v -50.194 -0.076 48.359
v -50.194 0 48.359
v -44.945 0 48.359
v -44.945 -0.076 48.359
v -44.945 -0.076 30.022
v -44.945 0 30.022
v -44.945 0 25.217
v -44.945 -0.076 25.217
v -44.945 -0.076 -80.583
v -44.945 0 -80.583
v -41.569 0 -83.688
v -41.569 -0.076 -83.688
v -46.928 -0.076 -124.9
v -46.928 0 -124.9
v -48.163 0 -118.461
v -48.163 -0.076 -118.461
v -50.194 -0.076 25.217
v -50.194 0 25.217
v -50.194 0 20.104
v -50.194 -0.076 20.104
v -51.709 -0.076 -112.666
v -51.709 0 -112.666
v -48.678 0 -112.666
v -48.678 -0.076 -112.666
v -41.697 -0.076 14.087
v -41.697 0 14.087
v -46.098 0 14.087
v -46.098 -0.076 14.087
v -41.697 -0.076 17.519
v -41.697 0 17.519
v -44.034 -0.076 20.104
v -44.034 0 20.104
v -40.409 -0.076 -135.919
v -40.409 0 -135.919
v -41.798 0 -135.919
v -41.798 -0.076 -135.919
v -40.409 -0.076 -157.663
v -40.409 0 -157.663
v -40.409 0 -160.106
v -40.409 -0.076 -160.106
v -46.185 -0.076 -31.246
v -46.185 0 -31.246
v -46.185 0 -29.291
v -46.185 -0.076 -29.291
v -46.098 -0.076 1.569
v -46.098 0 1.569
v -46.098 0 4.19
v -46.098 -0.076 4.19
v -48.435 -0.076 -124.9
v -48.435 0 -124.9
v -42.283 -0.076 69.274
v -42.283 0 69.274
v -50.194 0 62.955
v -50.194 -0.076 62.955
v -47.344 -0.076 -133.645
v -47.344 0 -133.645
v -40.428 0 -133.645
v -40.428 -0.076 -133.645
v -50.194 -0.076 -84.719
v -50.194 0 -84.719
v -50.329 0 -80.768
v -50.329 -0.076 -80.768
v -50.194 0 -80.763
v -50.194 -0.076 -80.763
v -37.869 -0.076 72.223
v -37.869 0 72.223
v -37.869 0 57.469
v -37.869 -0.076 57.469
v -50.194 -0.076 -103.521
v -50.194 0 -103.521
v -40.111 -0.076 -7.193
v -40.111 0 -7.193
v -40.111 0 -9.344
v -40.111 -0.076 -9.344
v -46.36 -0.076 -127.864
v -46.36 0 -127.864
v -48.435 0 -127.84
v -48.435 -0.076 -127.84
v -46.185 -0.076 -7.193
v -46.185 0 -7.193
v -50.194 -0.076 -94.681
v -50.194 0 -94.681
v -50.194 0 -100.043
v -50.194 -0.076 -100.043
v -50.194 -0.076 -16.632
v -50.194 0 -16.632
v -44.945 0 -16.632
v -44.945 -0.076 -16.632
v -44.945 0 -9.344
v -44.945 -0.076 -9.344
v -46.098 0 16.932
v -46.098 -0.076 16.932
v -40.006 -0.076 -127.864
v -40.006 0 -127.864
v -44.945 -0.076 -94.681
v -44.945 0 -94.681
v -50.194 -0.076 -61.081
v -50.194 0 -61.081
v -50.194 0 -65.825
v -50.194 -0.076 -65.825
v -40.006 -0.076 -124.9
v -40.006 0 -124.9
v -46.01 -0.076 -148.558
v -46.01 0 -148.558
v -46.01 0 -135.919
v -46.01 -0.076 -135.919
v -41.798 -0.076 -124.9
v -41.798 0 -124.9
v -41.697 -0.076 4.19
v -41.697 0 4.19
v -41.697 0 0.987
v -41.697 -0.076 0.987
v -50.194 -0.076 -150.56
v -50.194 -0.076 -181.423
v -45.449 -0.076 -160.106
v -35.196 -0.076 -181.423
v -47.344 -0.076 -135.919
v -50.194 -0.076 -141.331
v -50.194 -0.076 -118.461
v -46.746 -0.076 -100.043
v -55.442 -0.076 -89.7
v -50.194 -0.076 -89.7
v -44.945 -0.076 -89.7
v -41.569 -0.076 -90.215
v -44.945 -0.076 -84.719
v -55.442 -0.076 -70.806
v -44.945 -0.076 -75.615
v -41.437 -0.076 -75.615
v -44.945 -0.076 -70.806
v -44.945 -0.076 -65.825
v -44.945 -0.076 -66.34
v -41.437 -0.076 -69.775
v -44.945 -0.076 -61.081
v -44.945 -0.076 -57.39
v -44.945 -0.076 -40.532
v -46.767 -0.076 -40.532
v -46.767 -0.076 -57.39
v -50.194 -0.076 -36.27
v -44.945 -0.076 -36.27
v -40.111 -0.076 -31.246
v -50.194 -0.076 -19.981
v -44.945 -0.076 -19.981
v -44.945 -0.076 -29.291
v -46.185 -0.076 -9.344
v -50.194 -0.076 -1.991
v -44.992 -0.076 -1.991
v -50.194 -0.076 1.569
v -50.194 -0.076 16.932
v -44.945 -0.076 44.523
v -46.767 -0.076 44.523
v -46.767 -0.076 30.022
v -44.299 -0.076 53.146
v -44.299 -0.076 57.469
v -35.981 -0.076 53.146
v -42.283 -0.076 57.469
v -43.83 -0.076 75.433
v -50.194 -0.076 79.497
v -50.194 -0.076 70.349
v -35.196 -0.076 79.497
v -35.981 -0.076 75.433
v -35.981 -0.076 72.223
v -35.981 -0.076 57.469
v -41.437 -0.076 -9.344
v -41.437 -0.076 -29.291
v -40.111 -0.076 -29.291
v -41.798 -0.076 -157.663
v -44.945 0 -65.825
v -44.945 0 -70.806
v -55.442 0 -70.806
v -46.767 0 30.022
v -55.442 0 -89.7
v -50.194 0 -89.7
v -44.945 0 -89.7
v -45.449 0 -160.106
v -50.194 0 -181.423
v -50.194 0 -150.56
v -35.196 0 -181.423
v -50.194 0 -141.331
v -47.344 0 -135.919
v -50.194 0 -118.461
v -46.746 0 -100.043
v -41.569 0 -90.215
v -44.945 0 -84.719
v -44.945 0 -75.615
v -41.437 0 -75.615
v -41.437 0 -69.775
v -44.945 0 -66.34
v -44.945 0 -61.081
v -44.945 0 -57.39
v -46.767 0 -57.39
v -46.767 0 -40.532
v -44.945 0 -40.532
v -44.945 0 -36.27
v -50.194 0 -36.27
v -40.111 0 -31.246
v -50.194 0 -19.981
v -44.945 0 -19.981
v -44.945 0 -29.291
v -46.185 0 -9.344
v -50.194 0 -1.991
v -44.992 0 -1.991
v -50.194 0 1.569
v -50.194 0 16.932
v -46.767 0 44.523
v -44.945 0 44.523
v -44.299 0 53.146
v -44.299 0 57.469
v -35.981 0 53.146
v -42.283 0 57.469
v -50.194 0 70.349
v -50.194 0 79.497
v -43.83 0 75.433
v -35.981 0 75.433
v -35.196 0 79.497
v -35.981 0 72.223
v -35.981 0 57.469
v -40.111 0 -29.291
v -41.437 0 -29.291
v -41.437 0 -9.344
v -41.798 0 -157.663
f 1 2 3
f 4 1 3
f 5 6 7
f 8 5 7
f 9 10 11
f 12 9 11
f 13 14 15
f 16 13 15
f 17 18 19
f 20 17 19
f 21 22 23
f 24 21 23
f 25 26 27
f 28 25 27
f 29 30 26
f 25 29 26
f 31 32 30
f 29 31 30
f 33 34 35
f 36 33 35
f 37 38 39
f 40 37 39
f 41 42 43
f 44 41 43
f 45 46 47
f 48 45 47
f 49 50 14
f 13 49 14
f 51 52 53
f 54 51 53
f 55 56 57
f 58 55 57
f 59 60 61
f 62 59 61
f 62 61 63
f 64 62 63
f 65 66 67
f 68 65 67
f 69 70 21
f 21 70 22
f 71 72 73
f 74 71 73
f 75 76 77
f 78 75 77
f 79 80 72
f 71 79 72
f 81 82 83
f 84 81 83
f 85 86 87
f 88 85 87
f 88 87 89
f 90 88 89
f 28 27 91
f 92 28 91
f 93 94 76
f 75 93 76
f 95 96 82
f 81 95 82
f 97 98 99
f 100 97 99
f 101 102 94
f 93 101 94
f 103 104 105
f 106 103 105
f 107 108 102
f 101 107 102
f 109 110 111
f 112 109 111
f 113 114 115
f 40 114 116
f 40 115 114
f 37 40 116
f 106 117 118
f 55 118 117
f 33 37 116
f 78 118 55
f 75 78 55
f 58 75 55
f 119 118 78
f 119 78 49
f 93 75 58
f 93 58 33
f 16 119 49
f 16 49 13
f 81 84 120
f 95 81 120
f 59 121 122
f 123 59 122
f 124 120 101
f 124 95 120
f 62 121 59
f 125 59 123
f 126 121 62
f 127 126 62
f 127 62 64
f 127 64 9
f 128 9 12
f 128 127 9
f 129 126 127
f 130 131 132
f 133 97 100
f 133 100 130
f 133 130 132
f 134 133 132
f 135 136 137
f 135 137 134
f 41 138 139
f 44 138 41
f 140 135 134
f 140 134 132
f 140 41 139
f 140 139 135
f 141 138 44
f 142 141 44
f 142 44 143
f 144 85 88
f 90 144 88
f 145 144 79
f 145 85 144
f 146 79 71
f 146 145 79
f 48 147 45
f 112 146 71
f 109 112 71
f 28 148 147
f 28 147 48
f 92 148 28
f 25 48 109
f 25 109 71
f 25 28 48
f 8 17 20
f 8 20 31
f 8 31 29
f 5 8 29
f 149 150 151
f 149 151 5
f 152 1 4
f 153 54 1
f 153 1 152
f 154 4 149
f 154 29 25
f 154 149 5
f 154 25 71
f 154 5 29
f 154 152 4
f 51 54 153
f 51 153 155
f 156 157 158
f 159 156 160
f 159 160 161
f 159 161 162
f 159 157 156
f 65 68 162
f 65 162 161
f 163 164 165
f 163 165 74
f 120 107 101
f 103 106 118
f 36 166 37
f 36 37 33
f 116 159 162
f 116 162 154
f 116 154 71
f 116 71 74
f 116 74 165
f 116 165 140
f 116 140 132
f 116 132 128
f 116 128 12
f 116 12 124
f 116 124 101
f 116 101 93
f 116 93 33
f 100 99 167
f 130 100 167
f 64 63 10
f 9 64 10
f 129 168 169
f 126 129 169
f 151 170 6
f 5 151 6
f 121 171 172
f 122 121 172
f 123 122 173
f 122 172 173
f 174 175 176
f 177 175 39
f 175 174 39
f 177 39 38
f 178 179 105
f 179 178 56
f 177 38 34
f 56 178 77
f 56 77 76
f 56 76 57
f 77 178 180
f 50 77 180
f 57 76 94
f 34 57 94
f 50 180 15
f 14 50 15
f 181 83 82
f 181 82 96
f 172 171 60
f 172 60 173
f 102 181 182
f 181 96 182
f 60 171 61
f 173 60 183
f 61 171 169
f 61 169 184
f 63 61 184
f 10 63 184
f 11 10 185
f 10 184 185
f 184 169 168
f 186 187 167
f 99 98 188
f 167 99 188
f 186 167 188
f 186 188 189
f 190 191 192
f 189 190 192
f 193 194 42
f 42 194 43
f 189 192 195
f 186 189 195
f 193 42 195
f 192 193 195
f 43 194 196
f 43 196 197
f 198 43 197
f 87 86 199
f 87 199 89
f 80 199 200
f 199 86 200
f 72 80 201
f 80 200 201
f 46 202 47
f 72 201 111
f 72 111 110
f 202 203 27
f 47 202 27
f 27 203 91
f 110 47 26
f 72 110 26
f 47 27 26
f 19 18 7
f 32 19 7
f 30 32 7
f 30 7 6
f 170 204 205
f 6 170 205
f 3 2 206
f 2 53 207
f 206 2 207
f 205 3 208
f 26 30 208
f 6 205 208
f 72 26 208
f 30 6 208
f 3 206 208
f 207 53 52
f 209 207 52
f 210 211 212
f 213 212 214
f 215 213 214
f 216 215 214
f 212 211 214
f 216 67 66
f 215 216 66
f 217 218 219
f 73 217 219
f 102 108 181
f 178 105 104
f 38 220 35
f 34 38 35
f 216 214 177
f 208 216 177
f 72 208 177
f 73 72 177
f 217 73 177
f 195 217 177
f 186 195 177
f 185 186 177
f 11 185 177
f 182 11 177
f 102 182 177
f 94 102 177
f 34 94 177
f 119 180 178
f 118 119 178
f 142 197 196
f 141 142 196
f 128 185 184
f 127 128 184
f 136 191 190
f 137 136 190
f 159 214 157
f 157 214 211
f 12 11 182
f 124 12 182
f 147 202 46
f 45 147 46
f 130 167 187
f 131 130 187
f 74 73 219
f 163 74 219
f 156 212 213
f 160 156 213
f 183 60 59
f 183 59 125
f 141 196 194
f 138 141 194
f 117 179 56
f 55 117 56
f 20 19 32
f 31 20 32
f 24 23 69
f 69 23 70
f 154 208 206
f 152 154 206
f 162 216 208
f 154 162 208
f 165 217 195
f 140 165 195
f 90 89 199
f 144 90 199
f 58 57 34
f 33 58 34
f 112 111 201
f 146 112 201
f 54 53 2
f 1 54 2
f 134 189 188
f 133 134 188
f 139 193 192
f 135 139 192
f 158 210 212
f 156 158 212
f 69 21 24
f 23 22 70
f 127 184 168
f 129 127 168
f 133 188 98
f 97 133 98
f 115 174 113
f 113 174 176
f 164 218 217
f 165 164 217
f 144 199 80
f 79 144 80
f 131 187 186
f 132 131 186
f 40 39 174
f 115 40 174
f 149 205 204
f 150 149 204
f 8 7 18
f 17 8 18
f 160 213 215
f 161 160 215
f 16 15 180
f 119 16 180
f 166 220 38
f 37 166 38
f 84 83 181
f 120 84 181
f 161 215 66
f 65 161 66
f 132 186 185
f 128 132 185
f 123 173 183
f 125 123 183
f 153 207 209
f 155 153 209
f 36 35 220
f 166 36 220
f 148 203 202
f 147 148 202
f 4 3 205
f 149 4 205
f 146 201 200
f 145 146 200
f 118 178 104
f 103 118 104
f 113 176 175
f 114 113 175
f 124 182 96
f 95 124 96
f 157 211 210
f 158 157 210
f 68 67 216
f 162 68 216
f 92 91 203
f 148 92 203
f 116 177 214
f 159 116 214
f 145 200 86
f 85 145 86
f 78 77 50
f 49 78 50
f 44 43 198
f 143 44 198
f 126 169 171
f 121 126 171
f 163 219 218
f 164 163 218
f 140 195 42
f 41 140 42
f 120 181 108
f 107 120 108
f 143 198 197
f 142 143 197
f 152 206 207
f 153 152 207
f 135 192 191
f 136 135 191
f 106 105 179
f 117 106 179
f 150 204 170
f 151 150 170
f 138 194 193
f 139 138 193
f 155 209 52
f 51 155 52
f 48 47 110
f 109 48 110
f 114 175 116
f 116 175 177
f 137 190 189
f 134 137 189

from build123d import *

# Parameters (mm, degrees)
F0_W     = 5.2482880054
F0_H     = 4.9810466543
F1_DEPTH = 0.0762


# Not quite as in the source:
# - a feature names something its author has since deleted; it is built from what else it names


with BuildPart() as f1:
    # F0 (on Front) → F1 (new body)
    with BuildSketch(Plane.XZ):
        Polygon((-35.1963832856, 79.4969911185), (-50.193608411, 79.4969911185), (-50.193608411, 70.3488993556), (-43.8295094164, 75.4326850121), (-35.9808335364, 75.4326850121), (-35.9808335364, 72.2227817215), (-37.8685602848, 72.2227817215), (-37.8685602848, 57.4692988183), (-35.9808335364, 57.4692988183), (-35.9808335364, 53.1461095161), (-44.2987100306, 53.1461095161), (-44.2987100306, 57.4692988183), (-42.2831444735, 57.4692988183), (-42.2831444735, 69.2738860086), (-50.193608411, 62.954829197), (-50.193608411, 48.3592389848), (-44.9453204056, 48.3592389848), (-44.9453204056, 44.5231835829), (-46.7674447154, 44.5231835829), (-46.7674447154, 30.0220460158), (-44.9453204056, 30.0220460158), (-44.9453204056, 25.2169134009), (-50.193608411, 25.2169134009), (-50.193608411, 20.1037506657), (-44.0339450055, 20.1037506657), (-41.6973850482, 17.5189805853), (-41.6973850482, 14.0874953759), (-46.0979307142, 14.0874953759), (-46.0979307142, 16.9323027027), (-50.193608411, 16.9323027027), (-50.193608411, 1.5689273412), (-46.0979307142, 1.5689273412), (-46.0979307142, 4.1895659023), (-41.6973850482, 4.1895659023), (-41.6973850482, 0.9874830587), (-44.9919385552, -1.9907012912), (-50.193608411, -1.9907012912), (-50.193608411, -16.6316394584), (-44.9453204056, -16.6316394584), (-44.9453204056, -9.343899268), (-46.1852711141, -9.343899268), (-46.1852711141, -7.1931303074), (-44.9453204056, -7.1931303074), (-41.4369731104, -7.1931303074), (-40.111375595, -7.1931303074), (-40.111375595, -9.343899268), (-41.4369731104, -9.343899268), (-41.4369731104, -29.2911320519), (-40.111375595, -29.2911320519), (-40.111375595, -31.2461041507), (-41.4369731104, -31.2461041507), (-44.9453204056, -31.2461041507), (-46.1852711141, -31.2461041507), (-46.1852711141, -29.2911320519), (-44.9453204056, -29.2911320519), (-44.9453204056, -19.9807869131), (-50.193608411, -19.9807869131), (-50.193608411, -36.2698242769), (-44.9453204056, -36.2698242769), (-44.9453204056, -40.5323778866), (-46.7674447154, -40.5323778866), (-46.7674447154, -57.3903505305), (-44.9453204056, -57.3903505305), (-44.9453204056, -61.0807400528), (-50.193608411, -61.0807400528), (-50.193608411, -65.8248991014), (-44.9453204056, -65.8248991014), (-44.9453204056, -66.3401821199), (-41.4369731104, -69.7753881654), (-41.4369731104, -75.6152342194), (-44.9453204056, -75.6152342194), (-44.9453204056, -70.8059457557), (-50.193608411, -70.8059457557), (-50.193608411, -73.4616260623), (-50.193608411, -80.7633897693), (-44.9453204056, -80.5831793362), (-41.5694830255, -83.6879705381), (-41.5694830255, -90.214866248), (-44.9453204056, -94.6806298838), (-50.193608411, -94.6806298838), (-50.193608411, -100.0432713063), (-46.7460826389, -100.0432713063), (-41.7978071284, -124.8997201194), (-40.0056464088, -124.8997201194), (-40.0056464088, -127.8638071794), (-41.2077341248, -127.8638071794), (-46.3596858381, -127.8638071794), (-48.4354351813, -127.8397336649), (-48.4354351813, -124.8997201194), (-46.9281419303, -124.8997201194), (-48.1628723165, -118.4614948803), (-50.193608411, -118.4614948803), (-50.193608411, -141.3308172114), (-46.009728736, -148.5575184684), (-46.009728736, -135.918805119), (-47.3438533436, -135.918805119), (-47.3438533436, -135.2590725668), (-47.3438533436, -133.6447787085), (-46.009728736, -133.6447787085), (-41.7978071284, -133.6447787085), (-40.4277944904, -133.6447787085), (-40.4089242338, -135.918805119), (-41.7978071284, -135.918805119), (-41.7978071284, -157.6631183666), (-40.4089242338, -157.6631183666), (-40.4089242338, -160.1064702757), (-41.7978071284, -160.1064702757), (-45.4491030418, -160.1064702757), (-50.193608411, -150.5596009381), (-50.193608411, -181.4232210127), (-35.1963832856, -181.4232210127), (-35.1963832856, -73.4616260623), (-35.1963832856, 72.2227817215), (-35.1963832856, 75.4326850121), align=None)
        with Locations((-47.5694644083, -87.2090599023)):
            Rectangle(F0_W, F0_H)
        Polygon((-55.4418964164, -89.6995832295), (-50.193608411, -89.6995832295), (-50.193608411, -84.7185365752), (-50.3292563299, -80.7680475111), (-50.193608411, -80.7633897693), (-50.193608411, -73.4616260623), (-50.193608411, -70.8059457557), (-55.4418964164, -70.8059457557), align=None)
    extrude(amount=F1_DEPTH)


with BuildPart() as f1b:
    # F0 (on Front) → F1, piece 2 (new body)
    with BuildSketch(Plane.XZ):
        Polygon((-51.709150179, -112.6655470911), (-50.193608411, -112.6655470911), (-50.193608411, -103.5208382904), align=None)
        Polygon((-50.193608411, -103.5208382904), (-50.193608411, -112.6655470911), (-48.6780666431, -112.6655470911), align=None)
    extrude(amount=F1_DEPTH)


solid = Compound([f1.part, f1b.part])
